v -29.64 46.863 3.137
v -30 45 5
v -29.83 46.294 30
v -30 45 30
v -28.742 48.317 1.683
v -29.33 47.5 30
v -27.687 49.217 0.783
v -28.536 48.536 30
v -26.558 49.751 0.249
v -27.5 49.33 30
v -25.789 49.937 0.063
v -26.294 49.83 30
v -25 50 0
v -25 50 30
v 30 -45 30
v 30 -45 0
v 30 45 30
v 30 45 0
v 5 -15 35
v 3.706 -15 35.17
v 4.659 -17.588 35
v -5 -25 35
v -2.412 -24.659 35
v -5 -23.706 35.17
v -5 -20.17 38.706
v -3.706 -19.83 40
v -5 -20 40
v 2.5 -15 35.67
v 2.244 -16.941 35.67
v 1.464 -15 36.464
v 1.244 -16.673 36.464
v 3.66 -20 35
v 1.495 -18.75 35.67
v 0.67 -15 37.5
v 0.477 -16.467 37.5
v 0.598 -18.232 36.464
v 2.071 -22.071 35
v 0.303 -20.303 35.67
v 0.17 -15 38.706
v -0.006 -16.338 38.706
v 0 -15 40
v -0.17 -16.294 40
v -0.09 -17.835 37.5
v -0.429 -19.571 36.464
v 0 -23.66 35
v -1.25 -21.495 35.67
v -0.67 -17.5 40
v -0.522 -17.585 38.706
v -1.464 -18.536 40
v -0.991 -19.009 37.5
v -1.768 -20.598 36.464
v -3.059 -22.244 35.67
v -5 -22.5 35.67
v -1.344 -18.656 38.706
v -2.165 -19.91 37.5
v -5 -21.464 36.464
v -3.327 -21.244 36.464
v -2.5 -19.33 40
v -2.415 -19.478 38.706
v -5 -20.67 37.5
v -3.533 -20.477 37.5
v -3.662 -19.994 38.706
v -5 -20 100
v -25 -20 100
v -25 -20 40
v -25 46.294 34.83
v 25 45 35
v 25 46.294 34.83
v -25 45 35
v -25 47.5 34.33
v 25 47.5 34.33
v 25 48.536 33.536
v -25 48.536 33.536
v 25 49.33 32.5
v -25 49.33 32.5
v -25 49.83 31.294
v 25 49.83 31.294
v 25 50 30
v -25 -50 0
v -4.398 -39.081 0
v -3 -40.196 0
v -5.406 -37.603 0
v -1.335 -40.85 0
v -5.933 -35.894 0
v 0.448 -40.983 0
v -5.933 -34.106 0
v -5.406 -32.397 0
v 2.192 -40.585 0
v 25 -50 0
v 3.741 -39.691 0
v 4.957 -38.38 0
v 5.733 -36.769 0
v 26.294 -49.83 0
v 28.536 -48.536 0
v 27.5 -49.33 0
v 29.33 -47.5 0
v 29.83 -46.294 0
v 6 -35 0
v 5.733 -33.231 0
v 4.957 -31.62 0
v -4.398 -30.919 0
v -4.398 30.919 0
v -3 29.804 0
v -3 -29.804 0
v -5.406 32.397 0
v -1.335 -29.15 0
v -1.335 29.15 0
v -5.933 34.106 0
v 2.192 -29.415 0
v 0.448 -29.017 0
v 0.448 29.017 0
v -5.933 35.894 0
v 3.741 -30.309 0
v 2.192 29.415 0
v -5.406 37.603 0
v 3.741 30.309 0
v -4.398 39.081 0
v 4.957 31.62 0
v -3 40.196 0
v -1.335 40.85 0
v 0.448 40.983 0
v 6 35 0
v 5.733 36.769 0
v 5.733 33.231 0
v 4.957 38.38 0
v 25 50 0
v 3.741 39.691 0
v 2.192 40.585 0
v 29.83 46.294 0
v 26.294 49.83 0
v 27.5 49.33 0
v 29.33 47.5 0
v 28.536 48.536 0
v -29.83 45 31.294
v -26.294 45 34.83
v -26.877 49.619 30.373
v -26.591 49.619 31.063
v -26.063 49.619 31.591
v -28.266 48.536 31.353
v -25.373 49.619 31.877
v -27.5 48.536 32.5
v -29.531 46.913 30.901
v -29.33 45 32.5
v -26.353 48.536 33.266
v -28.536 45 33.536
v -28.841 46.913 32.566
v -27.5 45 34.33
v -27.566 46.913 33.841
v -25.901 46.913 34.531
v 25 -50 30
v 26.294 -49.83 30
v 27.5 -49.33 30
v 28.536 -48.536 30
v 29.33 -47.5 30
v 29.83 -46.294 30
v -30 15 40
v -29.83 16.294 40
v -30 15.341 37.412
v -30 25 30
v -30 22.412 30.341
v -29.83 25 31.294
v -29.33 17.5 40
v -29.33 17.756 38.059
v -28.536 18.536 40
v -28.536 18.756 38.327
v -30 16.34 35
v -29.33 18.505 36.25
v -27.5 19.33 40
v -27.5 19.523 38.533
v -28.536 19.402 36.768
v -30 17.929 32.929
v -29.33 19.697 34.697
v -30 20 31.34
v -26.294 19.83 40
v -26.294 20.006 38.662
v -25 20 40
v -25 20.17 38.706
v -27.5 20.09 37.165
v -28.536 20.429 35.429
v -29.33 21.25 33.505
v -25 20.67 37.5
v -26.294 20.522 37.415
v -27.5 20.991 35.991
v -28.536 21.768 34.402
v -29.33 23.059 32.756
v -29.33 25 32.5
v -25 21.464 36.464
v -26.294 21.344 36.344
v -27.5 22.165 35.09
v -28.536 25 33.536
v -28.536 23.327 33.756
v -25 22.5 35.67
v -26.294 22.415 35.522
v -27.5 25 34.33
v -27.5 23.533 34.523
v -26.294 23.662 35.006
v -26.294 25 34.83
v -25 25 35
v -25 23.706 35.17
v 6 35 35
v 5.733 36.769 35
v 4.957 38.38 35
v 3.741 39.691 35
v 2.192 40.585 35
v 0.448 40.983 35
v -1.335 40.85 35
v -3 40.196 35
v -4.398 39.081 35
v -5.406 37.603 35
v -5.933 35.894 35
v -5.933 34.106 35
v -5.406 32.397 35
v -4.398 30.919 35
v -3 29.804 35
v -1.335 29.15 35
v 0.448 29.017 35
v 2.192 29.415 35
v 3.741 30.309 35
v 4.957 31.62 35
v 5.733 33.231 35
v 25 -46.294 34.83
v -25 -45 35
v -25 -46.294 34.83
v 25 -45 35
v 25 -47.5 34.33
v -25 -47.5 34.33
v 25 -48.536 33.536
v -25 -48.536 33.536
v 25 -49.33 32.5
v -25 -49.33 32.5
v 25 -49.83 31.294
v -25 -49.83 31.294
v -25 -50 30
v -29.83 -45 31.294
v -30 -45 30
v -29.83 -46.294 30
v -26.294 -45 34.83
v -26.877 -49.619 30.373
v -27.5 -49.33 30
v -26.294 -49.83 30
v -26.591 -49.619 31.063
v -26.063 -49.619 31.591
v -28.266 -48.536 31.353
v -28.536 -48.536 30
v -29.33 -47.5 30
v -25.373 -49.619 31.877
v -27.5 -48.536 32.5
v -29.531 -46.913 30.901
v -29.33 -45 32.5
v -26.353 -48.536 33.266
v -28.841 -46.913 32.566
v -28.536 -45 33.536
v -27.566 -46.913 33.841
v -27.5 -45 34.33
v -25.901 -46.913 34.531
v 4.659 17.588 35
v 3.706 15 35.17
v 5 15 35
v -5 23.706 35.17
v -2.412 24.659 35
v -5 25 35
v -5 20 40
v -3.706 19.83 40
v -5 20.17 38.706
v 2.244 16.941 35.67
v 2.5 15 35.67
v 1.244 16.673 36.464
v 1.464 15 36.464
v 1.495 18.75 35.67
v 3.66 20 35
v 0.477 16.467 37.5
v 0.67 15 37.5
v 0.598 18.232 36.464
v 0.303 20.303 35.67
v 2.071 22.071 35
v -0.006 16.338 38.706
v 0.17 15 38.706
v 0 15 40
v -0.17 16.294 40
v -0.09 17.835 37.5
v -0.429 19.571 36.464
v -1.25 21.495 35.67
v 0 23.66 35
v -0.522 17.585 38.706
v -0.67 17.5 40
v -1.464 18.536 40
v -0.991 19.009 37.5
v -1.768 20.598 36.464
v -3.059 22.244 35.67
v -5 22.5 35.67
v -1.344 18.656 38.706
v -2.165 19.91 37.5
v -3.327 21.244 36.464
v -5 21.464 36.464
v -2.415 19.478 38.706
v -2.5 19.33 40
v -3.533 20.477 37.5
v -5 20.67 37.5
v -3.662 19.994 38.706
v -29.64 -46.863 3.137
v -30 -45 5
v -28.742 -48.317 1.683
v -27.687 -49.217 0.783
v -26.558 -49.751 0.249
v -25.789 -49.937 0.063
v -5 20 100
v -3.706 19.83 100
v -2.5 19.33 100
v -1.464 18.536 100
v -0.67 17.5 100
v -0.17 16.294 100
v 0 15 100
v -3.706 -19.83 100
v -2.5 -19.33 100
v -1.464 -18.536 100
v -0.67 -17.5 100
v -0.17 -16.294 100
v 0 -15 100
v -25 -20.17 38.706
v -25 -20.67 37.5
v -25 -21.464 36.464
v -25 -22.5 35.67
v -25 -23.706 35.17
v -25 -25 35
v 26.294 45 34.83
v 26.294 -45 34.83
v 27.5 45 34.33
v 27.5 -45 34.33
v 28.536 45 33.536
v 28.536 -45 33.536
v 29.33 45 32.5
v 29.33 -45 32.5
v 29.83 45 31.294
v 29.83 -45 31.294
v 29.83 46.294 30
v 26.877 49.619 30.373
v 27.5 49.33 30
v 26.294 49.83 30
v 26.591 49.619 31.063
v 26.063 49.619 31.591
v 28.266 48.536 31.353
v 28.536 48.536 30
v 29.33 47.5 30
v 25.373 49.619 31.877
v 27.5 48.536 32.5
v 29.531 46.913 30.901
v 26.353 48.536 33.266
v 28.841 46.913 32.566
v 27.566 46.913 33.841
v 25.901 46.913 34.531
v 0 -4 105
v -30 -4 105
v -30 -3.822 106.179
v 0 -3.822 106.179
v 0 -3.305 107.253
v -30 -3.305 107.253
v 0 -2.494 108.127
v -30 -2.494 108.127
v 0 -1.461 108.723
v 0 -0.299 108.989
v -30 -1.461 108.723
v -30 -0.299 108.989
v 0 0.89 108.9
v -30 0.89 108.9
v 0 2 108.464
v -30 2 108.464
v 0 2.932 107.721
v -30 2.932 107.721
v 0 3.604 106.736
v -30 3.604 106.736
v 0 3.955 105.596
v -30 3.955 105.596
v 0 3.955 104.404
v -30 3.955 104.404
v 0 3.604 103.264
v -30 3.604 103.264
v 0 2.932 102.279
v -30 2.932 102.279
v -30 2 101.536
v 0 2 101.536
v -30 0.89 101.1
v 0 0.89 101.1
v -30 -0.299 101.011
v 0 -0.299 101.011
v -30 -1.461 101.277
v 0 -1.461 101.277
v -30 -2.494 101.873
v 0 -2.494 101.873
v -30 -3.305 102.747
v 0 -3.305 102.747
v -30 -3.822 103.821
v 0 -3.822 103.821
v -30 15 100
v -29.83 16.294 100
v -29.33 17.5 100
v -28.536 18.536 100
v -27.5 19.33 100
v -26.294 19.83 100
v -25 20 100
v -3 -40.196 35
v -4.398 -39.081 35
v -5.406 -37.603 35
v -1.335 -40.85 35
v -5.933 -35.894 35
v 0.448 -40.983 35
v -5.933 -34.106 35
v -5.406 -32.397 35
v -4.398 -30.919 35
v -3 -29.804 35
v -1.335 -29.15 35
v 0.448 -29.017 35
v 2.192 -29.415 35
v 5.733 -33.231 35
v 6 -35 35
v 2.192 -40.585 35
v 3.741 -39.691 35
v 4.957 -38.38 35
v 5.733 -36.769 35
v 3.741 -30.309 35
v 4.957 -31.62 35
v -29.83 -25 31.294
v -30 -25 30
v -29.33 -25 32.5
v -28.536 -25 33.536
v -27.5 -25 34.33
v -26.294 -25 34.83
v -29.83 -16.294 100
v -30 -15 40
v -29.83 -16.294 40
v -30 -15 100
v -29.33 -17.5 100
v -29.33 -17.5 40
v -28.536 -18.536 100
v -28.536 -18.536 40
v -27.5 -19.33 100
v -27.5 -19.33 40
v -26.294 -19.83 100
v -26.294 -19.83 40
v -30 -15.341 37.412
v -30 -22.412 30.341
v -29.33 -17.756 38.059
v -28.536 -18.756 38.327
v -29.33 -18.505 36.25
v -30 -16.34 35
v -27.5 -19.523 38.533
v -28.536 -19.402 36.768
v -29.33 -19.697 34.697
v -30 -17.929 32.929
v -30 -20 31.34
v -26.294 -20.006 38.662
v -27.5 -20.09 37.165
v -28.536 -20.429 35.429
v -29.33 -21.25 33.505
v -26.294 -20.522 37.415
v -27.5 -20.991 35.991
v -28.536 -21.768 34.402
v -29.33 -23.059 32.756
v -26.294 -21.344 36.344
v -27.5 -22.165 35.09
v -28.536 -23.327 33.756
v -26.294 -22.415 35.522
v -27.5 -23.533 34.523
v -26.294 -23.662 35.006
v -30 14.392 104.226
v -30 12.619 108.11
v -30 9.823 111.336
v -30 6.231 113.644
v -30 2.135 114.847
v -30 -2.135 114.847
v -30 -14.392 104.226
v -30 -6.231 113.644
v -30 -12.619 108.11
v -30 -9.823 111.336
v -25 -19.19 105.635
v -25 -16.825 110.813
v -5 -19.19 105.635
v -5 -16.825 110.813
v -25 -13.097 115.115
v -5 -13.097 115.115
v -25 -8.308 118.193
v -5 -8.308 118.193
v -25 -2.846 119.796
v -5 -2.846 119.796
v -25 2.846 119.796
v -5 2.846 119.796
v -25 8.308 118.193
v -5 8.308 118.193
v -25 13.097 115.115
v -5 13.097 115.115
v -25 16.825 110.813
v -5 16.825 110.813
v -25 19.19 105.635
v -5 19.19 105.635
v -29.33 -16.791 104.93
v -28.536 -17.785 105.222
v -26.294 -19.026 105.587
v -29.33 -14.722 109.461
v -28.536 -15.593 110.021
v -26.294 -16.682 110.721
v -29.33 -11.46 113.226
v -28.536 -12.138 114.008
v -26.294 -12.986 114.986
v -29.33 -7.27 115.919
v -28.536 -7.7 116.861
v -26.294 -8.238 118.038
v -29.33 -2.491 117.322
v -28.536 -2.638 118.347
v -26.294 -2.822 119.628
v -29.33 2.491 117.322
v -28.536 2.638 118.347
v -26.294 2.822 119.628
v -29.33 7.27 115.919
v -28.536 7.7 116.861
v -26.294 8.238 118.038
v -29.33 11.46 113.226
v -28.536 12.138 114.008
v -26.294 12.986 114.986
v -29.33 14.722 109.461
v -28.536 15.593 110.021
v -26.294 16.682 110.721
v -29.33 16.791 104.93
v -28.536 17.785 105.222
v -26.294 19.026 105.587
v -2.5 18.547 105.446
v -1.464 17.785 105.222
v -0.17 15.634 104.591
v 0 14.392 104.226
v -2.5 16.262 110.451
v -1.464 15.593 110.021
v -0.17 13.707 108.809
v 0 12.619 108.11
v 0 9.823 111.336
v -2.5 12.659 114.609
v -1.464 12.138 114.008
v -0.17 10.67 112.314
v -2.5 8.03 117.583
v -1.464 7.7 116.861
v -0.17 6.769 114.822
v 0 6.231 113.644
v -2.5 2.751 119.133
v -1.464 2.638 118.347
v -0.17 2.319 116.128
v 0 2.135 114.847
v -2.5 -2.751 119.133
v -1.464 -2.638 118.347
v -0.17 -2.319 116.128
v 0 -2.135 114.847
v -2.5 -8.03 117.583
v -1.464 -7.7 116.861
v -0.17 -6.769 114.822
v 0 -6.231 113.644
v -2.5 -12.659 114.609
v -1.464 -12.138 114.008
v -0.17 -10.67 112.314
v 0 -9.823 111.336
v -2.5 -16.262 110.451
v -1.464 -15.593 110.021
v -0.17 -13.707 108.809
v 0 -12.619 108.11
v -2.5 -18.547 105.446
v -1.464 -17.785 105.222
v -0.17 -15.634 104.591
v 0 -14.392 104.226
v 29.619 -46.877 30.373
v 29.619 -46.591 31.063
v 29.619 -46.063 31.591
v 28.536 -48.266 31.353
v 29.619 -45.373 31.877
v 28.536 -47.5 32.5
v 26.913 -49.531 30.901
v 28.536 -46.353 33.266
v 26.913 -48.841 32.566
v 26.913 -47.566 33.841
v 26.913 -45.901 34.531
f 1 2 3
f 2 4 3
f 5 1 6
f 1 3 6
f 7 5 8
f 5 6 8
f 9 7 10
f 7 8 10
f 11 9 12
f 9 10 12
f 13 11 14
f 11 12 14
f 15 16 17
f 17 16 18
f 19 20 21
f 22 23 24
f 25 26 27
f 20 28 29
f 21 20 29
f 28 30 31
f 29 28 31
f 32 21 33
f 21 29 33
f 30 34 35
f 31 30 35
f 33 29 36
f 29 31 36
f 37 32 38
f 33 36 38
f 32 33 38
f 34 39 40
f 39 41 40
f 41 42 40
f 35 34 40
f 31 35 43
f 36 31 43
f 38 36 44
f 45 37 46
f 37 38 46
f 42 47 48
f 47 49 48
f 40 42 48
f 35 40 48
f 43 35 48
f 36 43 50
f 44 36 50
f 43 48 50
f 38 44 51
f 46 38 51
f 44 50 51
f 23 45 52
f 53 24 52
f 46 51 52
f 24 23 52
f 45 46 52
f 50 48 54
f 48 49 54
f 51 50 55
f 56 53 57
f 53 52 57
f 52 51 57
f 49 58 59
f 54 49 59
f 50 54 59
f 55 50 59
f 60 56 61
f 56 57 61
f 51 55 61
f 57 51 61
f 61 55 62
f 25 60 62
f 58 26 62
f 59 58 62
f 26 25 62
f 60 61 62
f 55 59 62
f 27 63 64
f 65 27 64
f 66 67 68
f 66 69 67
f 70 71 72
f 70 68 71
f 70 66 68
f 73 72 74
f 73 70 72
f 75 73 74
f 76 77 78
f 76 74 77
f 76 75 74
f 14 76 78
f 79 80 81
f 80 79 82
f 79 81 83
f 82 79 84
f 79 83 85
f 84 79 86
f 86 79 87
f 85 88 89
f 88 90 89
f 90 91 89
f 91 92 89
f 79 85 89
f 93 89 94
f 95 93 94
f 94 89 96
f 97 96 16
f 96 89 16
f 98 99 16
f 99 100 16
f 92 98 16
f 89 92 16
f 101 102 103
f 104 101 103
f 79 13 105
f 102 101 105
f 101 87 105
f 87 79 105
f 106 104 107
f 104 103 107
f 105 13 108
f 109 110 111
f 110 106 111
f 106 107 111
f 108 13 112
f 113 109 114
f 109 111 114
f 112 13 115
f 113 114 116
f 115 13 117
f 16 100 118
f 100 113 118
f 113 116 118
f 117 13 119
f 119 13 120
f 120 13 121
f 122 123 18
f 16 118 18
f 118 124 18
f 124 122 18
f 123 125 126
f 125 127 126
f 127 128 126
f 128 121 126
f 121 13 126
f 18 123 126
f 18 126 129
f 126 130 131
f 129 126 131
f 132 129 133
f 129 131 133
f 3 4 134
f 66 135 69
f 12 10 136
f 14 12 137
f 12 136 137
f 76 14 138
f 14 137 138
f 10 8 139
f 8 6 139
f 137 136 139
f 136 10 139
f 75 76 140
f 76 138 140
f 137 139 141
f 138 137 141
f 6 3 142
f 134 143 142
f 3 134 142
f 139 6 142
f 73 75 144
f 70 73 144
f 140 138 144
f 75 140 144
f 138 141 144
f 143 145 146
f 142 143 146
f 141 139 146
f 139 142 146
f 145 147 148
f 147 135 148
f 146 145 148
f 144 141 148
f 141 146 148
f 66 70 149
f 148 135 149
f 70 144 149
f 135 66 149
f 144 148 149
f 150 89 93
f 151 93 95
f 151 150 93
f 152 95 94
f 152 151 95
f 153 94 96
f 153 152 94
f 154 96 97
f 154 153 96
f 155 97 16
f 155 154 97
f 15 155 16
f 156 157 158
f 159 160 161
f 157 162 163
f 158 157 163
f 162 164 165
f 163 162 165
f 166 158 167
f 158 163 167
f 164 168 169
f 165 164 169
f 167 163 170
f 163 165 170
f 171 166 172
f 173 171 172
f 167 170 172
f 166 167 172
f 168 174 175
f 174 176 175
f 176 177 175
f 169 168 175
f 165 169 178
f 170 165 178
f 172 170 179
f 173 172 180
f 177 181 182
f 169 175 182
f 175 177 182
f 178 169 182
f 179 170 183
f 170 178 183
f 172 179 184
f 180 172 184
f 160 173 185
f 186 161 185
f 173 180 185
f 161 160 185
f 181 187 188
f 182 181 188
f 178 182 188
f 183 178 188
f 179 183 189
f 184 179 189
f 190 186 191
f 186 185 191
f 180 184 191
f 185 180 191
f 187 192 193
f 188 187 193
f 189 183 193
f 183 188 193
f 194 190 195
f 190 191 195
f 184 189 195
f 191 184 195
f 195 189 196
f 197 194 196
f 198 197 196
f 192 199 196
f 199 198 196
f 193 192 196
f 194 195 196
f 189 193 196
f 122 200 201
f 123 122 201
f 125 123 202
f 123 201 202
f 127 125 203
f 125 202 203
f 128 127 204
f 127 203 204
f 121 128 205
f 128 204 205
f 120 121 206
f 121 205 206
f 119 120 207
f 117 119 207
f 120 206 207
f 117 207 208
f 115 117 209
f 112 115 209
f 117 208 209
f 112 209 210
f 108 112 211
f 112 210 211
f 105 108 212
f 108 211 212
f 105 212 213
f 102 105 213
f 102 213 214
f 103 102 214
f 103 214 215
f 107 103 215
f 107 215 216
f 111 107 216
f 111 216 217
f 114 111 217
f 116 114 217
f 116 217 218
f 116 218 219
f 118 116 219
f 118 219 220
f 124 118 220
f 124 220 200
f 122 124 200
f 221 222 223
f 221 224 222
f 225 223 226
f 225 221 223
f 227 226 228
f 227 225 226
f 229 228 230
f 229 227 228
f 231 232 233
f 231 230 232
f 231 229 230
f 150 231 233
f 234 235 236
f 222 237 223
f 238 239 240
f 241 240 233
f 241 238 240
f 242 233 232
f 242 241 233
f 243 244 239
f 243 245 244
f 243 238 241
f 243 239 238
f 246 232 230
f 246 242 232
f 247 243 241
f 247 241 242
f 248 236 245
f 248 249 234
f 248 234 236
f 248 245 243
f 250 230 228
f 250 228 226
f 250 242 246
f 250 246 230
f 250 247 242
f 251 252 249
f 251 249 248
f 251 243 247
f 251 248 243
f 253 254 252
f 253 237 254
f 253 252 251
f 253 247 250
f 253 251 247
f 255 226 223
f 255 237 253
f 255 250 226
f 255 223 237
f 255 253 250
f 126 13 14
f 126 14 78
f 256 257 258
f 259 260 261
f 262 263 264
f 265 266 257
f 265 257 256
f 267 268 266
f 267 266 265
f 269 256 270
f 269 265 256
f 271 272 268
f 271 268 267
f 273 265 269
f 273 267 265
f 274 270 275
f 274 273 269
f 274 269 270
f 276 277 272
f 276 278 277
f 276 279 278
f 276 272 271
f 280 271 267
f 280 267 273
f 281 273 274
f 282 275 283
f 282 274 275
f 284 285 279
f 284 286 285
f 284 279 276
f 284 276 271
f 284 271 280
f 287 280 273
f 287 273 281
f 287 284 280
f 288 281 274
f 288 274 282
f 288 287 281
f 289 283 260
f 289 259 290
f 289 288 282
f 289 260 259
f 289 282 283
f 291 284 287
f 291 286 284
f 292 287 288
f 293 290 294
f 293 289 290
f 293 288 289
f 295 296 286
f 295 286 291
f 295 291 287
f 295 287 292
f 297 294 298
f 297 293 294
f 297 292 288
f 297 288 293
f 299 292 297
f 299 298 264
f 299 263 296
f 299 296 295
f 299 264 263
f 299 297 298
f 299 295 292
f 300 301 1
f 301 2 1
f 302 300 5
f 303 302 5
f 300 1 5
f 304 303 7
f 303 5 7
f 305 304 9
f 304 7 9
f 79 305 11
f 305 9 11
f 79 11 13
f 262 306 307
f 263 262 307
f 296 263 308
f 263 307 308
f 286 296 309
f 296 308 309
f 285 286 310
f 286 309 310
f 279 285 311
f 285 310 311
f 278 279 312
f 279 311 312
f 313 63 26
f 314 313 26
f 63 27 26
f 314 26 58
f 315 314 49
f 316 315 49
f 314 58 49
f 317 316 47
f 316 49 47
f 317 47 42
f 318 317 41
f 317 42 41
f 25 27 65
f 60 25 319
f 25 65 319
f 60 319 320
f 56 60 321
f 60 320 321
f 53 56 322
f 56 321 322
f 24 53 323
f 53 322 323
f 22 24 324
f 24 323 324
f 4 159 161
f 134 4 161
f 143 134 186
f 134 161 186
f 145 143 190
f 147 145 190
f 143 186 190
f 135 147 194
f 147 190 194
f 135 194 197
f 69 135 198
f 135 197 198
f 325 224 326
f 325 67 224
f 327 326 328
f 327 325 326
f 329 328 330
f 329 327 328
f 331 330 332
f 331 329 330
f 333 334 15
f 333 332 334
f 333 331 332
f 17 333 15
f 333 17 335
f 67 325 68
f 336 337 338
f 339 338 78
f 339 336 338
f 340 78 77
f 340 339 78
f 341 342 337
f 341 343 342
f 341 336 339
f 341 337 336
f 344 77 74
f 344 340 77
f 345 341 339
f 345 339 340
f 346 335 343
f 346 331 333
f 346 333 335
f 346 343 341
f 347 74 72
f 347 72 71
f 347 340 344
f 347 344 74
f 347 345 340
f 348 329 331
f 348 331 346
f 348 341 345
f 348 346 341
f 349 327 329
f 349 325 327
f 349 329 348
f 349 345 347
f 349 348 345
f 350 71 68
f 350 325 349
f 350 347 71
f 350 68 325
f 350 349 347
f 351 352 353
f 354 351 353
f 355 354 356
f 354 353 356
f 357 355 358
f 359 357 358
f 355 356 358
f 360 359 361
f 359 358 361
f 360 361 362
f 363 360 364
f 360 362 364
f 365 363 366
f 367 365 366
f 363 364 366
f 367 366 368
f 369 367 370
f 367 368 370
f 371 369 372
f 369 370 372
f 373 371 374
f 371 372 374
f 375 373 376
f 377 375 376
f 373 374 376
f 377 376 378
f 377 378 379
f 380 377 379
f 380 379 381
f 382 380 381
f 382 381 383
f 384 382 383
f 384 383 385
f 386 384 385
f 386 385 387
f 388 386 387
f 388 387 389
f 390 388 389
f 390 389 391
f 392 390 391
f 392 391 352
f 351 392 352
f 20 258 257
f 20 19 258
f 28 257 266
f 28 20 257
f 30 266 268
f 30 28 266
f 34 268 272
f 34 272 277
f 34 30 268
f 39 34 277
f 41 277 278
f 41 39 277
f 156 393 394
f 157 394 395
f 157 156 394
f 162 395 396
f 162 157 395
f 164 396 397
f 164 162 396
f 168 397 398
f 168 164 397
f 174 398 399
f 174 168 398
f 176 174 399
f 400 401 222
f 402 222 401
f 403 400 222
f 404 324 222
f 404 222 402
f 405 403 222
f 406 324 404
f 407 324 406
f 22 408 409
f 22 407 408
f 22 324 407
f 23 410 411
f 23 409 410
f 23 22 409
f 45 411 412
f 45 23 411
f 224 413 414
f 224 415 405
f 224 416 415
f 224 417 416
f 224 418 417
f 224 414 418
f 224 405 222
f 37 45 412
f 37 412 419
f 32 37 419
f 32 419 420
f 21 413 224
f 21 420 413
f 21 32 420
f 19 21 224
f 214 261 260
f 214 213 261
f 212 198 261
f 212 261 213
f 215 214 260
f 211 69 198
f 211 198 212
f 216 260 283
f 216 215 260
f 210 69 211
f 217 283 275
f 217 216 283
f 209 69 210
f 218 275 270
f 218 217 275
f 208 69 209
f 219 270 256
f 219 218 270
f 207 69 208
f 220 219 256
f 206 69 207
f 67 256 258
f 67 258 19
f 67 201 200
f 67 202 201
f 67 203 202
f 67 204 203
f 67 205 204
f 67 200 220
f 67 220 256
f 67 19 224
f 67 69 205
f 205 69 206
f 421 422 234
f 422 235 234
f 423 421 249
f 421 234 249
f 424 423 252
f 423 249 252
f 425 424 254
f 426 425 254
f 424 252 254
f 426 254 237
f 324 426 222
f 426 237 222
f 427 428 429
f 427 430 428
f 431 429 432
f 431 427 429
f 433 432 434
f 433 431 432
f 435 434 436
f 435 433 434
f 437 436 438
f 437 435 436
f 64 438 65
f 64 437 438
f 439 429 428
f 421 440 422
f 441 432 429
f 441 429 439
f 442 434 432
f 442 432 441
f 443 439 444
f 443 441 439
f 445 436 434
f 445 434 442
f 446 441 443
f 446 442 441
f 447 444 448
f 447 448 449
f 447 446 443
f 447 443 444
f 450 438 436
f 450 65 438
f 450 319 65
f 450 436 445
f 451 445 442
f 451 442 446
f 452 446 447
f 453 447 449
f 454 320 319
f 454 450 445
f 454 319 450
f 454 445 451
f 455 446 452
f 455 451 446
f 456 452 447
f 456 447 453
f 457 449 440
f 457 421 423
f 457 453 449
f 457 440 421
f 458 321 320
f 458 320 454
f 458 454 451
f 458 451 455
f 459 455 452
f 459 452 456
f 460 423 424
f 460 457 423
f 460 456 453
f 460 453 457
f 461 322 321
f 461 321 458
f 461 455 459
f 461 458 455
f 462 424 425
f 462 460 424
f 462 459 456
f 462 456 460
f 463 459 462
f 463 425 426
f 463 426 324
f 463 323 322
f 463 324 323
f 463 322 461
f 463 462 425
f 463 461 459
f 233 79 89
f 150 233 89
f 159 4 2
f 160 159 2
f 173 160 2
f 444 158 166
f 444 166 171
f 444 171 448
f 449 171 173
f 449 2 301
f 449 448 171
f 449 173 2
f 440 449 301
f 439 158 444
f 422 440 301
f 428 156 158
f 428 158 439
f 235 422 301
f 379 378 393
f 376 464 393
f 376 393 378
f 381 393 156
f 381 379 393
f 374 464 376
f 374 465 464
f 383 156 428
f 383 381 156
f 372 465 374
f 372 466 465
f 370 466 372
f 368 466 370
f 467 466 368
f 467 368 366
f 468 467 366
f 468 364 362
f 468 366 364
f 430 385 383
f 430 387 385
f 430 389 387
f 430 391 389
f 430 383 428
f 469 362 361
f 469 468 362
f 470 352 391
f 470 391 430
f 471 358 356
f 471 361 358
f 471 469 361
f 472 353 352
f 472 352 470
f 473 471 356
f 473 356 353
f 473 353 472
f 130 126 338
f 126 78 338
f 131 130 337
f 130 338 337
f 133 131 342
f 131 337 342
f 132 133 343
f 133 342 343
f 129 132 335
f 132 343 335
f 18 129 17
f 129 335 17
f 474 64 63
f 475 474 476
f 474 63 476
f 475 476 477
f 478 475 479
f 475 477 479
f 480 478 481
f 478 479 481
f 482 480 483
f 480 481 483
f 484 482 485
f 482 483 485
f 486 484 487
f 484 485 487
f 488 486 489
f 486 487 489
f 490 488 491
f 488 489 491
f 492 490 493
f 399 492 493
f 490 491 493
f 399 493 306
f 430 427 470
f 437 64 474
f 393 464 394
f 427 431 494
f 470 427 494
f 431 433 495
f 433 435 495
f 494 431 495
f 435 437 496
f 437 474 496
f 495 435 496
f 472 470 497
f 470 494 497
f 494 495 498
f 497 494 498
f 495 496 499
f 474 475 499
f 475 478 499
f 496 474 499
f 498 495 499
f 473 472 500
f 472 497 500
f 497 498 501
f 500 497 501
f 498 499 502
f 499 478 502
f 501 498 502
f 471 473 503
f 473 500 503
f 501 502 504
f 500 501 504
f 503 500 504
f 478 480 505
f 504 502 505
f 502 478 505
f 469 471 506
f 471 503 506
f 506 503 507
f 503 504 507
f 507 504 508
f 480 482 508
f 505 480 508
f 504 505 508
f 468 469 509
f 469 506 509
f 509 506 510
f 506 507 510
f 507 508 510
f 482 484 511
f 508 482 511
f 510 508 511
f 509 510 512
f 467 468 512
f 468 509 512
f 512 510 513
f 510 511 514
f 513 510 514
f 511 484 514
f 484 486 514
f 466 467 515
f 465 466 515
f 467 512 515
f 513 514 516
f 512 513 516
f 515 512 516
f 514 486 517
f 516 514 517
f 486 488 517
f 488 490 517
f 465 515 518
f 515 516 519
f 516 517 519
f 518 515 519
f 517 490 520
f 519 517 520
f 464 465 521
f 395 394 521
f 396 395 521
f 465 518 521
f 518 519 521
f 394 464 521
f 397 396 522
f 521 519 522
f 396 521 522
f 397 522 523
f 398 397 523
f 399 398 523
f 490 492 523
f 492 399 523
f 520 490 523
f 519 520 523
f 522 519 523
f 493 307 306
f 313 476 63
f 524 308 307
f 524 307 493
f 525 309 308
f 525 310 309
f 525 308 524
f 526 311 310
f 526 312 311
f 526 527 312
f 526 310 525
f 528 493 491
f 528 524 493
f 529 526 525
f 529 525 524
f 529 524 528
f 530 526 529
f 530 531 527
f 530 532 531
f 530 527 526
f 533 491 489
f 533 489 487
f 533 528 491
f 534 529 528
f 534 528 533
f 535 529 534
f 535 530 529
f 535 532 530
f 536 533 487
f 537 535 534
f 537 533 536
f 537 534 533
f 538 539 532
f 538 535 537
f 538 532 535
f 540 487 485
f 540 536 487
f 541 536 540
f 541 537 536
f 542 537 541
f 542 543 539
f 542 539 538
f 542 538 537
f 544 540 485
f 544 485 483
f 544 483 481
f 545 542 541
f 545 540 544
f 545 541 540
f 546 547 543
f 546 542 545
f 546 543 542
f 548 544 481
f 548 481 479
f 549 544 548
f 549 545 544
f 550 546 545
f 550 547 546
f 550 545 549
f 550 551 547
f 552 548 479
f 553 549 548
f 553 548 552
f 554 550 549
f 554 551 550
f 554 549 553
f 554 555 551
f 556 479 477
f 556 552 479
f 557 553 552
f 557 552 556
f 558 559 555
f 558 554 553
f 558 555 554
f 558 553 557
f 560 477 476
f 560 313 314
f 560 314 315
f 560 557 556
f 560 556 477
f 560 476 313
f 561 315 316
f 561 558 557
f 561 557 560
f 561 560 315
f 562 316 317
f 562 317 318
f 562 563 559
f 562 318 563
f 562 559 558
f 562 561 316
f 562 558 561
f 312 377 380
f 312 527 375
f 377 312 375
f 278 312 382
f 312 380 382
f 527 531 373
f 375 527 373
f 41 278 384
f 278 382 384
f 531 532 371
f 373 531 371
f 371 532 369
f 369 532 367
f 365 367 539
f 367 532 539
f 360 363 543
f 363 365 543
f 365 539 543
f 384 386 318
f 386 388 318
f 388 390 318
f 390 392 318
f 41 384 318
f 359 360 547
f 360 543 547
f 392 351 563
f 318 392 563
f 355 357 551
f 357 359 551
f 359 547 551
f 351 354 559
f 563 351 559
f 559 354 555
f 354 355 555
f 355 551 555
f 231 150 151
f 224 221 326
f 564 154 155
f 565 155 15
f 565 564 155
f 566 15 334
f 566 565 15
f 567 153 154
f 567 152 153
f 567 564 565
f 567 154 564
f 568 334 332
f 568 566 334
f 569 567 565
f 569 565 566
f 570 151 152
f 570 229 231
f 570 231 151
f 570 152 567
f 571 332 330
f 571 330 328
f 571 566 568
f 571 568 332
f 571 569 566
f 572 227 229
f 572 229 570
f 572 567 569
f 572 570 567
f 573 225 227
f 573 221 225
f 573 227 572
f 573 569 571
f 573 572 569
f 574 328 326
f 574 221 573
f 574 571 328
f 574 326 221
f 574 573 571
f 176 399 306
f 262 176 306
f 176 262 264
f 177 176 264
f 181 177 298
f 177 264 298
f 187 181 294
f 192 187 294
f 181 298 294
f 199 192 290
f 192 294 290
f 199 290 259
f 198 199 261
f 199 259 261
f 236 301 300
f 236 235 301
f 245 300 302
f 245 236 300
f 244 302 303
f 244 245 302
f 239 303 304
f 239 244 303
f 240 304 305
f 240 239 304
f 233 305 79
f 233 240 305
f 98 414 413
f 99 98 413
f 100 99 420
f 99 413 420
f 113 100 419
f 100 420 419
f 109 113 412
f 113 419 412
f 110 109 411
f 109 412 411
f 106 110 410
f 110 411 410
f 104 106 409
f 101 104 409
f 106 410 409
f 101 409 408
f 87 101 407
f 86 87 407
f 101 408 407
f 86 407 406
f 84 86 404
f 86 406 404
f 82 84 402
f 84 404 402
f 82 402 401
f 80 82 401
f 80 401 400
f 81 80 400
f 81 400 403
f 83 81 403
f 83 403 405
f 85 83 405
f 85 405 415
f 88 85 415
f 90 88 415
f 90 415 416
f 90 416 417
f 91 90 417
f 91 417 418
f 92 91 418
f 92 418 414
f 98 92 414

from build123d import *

# Parameters (mm, degrees)
F0_W     = 60
F0_H     = 100
F1_DEPTH = 100
F2_R     = 6
F3_DEPTH = 100
F4_R     = 6
F5_DEPTH = 65
F6_W     = 30
F6_H     = 20
F7_ANGLE = 180
F8_R     = 4
F9_DEPTH = 50
F10_R    = 5


with BuildPart() as f1:
    # F0 (on Top) → F1 (new body)
    with BuildSketch(Plane.XY):
        Rectangle(F0_W, F0_H)
    extrude(amount=F1_DEPTH)

    # F2 (on face) → F3 (cut)
    with BuildSketch(Plane.XY.offset(100)):
        with Locations((0, 35)):
            Circle(F2_R)
        with Locations((0, -35)):
            Circle(F2_R)
    extrude(amount=-F3_DEPTH, mode=Mode.SUBTRACT)

    # F4 (on face) → F5 (cut)
    with BuildSketch(Plane.XY.offset(100)):
        Polygon((0, 20), (0, 0), (0, -20), (-30, -20), (-30, -50), (30, -50), (30, 50), (-30, 50), (-30, 20), align=None)
        with Locations((0, -35)):
            Circle(F4_R, mode=Mode.SUBTRACT)
        with Locations((0, 35)):
            Circle(F4_R, mode=Mode.SUBTRACT)
    extrude(amount=-F5_DEPTH, mode=Mode.SUBTRACT)

    # F6 (on face) → F7 (revolve)
    with BuildSketch(Plane.XY.offset(100)):
        with Locations((-15, -10)):
            Rectangle(F6_W, F6_H)
    revolve(axis=Axis((-15, 0, 100), (-1, 0, 0)), revolution_arc=F7_ANGLE)

    # F8 (on face) → F9 (cut)
    with BuildSketch(Plane(origin=(-30, 0, 0), x_dir=(0, -1, 0), z_dir=(-1, 0, 0))):
        with Locations((0, 105)):
            Circle(F8_R)
    extrude(amount=-F9_DEPTH, mode=Mode.SUBTRACT)

    # F10
    f10_edges = [f1.edges().sort_by_distance(p)[0] for p in [
        (-30, 20, 67.5),
        (-30, 35, 35),
        (-30, 50, 17.5),
        (-30, 0, 0),
        (-30, -35, 35),
        (-30, -50, 17.5),
        (0, -50, 35),
        (30, -50, 17.5),
        (30, 0, 35),
        (-15, -20, 35),
        (0, -20, 67.5),
        (30, 50, 17.5),
        (0, 50, 35),
        (0, 0, 35),
        (-15, 20, 35),
        (-30, -20, 67.5),
        (-30, 0, 120),
        (0, 20, 67.5),
        (0, 0, 120),
    ]]
    fillet(f10_edges, radius=F10_R)


solid = f1.part
